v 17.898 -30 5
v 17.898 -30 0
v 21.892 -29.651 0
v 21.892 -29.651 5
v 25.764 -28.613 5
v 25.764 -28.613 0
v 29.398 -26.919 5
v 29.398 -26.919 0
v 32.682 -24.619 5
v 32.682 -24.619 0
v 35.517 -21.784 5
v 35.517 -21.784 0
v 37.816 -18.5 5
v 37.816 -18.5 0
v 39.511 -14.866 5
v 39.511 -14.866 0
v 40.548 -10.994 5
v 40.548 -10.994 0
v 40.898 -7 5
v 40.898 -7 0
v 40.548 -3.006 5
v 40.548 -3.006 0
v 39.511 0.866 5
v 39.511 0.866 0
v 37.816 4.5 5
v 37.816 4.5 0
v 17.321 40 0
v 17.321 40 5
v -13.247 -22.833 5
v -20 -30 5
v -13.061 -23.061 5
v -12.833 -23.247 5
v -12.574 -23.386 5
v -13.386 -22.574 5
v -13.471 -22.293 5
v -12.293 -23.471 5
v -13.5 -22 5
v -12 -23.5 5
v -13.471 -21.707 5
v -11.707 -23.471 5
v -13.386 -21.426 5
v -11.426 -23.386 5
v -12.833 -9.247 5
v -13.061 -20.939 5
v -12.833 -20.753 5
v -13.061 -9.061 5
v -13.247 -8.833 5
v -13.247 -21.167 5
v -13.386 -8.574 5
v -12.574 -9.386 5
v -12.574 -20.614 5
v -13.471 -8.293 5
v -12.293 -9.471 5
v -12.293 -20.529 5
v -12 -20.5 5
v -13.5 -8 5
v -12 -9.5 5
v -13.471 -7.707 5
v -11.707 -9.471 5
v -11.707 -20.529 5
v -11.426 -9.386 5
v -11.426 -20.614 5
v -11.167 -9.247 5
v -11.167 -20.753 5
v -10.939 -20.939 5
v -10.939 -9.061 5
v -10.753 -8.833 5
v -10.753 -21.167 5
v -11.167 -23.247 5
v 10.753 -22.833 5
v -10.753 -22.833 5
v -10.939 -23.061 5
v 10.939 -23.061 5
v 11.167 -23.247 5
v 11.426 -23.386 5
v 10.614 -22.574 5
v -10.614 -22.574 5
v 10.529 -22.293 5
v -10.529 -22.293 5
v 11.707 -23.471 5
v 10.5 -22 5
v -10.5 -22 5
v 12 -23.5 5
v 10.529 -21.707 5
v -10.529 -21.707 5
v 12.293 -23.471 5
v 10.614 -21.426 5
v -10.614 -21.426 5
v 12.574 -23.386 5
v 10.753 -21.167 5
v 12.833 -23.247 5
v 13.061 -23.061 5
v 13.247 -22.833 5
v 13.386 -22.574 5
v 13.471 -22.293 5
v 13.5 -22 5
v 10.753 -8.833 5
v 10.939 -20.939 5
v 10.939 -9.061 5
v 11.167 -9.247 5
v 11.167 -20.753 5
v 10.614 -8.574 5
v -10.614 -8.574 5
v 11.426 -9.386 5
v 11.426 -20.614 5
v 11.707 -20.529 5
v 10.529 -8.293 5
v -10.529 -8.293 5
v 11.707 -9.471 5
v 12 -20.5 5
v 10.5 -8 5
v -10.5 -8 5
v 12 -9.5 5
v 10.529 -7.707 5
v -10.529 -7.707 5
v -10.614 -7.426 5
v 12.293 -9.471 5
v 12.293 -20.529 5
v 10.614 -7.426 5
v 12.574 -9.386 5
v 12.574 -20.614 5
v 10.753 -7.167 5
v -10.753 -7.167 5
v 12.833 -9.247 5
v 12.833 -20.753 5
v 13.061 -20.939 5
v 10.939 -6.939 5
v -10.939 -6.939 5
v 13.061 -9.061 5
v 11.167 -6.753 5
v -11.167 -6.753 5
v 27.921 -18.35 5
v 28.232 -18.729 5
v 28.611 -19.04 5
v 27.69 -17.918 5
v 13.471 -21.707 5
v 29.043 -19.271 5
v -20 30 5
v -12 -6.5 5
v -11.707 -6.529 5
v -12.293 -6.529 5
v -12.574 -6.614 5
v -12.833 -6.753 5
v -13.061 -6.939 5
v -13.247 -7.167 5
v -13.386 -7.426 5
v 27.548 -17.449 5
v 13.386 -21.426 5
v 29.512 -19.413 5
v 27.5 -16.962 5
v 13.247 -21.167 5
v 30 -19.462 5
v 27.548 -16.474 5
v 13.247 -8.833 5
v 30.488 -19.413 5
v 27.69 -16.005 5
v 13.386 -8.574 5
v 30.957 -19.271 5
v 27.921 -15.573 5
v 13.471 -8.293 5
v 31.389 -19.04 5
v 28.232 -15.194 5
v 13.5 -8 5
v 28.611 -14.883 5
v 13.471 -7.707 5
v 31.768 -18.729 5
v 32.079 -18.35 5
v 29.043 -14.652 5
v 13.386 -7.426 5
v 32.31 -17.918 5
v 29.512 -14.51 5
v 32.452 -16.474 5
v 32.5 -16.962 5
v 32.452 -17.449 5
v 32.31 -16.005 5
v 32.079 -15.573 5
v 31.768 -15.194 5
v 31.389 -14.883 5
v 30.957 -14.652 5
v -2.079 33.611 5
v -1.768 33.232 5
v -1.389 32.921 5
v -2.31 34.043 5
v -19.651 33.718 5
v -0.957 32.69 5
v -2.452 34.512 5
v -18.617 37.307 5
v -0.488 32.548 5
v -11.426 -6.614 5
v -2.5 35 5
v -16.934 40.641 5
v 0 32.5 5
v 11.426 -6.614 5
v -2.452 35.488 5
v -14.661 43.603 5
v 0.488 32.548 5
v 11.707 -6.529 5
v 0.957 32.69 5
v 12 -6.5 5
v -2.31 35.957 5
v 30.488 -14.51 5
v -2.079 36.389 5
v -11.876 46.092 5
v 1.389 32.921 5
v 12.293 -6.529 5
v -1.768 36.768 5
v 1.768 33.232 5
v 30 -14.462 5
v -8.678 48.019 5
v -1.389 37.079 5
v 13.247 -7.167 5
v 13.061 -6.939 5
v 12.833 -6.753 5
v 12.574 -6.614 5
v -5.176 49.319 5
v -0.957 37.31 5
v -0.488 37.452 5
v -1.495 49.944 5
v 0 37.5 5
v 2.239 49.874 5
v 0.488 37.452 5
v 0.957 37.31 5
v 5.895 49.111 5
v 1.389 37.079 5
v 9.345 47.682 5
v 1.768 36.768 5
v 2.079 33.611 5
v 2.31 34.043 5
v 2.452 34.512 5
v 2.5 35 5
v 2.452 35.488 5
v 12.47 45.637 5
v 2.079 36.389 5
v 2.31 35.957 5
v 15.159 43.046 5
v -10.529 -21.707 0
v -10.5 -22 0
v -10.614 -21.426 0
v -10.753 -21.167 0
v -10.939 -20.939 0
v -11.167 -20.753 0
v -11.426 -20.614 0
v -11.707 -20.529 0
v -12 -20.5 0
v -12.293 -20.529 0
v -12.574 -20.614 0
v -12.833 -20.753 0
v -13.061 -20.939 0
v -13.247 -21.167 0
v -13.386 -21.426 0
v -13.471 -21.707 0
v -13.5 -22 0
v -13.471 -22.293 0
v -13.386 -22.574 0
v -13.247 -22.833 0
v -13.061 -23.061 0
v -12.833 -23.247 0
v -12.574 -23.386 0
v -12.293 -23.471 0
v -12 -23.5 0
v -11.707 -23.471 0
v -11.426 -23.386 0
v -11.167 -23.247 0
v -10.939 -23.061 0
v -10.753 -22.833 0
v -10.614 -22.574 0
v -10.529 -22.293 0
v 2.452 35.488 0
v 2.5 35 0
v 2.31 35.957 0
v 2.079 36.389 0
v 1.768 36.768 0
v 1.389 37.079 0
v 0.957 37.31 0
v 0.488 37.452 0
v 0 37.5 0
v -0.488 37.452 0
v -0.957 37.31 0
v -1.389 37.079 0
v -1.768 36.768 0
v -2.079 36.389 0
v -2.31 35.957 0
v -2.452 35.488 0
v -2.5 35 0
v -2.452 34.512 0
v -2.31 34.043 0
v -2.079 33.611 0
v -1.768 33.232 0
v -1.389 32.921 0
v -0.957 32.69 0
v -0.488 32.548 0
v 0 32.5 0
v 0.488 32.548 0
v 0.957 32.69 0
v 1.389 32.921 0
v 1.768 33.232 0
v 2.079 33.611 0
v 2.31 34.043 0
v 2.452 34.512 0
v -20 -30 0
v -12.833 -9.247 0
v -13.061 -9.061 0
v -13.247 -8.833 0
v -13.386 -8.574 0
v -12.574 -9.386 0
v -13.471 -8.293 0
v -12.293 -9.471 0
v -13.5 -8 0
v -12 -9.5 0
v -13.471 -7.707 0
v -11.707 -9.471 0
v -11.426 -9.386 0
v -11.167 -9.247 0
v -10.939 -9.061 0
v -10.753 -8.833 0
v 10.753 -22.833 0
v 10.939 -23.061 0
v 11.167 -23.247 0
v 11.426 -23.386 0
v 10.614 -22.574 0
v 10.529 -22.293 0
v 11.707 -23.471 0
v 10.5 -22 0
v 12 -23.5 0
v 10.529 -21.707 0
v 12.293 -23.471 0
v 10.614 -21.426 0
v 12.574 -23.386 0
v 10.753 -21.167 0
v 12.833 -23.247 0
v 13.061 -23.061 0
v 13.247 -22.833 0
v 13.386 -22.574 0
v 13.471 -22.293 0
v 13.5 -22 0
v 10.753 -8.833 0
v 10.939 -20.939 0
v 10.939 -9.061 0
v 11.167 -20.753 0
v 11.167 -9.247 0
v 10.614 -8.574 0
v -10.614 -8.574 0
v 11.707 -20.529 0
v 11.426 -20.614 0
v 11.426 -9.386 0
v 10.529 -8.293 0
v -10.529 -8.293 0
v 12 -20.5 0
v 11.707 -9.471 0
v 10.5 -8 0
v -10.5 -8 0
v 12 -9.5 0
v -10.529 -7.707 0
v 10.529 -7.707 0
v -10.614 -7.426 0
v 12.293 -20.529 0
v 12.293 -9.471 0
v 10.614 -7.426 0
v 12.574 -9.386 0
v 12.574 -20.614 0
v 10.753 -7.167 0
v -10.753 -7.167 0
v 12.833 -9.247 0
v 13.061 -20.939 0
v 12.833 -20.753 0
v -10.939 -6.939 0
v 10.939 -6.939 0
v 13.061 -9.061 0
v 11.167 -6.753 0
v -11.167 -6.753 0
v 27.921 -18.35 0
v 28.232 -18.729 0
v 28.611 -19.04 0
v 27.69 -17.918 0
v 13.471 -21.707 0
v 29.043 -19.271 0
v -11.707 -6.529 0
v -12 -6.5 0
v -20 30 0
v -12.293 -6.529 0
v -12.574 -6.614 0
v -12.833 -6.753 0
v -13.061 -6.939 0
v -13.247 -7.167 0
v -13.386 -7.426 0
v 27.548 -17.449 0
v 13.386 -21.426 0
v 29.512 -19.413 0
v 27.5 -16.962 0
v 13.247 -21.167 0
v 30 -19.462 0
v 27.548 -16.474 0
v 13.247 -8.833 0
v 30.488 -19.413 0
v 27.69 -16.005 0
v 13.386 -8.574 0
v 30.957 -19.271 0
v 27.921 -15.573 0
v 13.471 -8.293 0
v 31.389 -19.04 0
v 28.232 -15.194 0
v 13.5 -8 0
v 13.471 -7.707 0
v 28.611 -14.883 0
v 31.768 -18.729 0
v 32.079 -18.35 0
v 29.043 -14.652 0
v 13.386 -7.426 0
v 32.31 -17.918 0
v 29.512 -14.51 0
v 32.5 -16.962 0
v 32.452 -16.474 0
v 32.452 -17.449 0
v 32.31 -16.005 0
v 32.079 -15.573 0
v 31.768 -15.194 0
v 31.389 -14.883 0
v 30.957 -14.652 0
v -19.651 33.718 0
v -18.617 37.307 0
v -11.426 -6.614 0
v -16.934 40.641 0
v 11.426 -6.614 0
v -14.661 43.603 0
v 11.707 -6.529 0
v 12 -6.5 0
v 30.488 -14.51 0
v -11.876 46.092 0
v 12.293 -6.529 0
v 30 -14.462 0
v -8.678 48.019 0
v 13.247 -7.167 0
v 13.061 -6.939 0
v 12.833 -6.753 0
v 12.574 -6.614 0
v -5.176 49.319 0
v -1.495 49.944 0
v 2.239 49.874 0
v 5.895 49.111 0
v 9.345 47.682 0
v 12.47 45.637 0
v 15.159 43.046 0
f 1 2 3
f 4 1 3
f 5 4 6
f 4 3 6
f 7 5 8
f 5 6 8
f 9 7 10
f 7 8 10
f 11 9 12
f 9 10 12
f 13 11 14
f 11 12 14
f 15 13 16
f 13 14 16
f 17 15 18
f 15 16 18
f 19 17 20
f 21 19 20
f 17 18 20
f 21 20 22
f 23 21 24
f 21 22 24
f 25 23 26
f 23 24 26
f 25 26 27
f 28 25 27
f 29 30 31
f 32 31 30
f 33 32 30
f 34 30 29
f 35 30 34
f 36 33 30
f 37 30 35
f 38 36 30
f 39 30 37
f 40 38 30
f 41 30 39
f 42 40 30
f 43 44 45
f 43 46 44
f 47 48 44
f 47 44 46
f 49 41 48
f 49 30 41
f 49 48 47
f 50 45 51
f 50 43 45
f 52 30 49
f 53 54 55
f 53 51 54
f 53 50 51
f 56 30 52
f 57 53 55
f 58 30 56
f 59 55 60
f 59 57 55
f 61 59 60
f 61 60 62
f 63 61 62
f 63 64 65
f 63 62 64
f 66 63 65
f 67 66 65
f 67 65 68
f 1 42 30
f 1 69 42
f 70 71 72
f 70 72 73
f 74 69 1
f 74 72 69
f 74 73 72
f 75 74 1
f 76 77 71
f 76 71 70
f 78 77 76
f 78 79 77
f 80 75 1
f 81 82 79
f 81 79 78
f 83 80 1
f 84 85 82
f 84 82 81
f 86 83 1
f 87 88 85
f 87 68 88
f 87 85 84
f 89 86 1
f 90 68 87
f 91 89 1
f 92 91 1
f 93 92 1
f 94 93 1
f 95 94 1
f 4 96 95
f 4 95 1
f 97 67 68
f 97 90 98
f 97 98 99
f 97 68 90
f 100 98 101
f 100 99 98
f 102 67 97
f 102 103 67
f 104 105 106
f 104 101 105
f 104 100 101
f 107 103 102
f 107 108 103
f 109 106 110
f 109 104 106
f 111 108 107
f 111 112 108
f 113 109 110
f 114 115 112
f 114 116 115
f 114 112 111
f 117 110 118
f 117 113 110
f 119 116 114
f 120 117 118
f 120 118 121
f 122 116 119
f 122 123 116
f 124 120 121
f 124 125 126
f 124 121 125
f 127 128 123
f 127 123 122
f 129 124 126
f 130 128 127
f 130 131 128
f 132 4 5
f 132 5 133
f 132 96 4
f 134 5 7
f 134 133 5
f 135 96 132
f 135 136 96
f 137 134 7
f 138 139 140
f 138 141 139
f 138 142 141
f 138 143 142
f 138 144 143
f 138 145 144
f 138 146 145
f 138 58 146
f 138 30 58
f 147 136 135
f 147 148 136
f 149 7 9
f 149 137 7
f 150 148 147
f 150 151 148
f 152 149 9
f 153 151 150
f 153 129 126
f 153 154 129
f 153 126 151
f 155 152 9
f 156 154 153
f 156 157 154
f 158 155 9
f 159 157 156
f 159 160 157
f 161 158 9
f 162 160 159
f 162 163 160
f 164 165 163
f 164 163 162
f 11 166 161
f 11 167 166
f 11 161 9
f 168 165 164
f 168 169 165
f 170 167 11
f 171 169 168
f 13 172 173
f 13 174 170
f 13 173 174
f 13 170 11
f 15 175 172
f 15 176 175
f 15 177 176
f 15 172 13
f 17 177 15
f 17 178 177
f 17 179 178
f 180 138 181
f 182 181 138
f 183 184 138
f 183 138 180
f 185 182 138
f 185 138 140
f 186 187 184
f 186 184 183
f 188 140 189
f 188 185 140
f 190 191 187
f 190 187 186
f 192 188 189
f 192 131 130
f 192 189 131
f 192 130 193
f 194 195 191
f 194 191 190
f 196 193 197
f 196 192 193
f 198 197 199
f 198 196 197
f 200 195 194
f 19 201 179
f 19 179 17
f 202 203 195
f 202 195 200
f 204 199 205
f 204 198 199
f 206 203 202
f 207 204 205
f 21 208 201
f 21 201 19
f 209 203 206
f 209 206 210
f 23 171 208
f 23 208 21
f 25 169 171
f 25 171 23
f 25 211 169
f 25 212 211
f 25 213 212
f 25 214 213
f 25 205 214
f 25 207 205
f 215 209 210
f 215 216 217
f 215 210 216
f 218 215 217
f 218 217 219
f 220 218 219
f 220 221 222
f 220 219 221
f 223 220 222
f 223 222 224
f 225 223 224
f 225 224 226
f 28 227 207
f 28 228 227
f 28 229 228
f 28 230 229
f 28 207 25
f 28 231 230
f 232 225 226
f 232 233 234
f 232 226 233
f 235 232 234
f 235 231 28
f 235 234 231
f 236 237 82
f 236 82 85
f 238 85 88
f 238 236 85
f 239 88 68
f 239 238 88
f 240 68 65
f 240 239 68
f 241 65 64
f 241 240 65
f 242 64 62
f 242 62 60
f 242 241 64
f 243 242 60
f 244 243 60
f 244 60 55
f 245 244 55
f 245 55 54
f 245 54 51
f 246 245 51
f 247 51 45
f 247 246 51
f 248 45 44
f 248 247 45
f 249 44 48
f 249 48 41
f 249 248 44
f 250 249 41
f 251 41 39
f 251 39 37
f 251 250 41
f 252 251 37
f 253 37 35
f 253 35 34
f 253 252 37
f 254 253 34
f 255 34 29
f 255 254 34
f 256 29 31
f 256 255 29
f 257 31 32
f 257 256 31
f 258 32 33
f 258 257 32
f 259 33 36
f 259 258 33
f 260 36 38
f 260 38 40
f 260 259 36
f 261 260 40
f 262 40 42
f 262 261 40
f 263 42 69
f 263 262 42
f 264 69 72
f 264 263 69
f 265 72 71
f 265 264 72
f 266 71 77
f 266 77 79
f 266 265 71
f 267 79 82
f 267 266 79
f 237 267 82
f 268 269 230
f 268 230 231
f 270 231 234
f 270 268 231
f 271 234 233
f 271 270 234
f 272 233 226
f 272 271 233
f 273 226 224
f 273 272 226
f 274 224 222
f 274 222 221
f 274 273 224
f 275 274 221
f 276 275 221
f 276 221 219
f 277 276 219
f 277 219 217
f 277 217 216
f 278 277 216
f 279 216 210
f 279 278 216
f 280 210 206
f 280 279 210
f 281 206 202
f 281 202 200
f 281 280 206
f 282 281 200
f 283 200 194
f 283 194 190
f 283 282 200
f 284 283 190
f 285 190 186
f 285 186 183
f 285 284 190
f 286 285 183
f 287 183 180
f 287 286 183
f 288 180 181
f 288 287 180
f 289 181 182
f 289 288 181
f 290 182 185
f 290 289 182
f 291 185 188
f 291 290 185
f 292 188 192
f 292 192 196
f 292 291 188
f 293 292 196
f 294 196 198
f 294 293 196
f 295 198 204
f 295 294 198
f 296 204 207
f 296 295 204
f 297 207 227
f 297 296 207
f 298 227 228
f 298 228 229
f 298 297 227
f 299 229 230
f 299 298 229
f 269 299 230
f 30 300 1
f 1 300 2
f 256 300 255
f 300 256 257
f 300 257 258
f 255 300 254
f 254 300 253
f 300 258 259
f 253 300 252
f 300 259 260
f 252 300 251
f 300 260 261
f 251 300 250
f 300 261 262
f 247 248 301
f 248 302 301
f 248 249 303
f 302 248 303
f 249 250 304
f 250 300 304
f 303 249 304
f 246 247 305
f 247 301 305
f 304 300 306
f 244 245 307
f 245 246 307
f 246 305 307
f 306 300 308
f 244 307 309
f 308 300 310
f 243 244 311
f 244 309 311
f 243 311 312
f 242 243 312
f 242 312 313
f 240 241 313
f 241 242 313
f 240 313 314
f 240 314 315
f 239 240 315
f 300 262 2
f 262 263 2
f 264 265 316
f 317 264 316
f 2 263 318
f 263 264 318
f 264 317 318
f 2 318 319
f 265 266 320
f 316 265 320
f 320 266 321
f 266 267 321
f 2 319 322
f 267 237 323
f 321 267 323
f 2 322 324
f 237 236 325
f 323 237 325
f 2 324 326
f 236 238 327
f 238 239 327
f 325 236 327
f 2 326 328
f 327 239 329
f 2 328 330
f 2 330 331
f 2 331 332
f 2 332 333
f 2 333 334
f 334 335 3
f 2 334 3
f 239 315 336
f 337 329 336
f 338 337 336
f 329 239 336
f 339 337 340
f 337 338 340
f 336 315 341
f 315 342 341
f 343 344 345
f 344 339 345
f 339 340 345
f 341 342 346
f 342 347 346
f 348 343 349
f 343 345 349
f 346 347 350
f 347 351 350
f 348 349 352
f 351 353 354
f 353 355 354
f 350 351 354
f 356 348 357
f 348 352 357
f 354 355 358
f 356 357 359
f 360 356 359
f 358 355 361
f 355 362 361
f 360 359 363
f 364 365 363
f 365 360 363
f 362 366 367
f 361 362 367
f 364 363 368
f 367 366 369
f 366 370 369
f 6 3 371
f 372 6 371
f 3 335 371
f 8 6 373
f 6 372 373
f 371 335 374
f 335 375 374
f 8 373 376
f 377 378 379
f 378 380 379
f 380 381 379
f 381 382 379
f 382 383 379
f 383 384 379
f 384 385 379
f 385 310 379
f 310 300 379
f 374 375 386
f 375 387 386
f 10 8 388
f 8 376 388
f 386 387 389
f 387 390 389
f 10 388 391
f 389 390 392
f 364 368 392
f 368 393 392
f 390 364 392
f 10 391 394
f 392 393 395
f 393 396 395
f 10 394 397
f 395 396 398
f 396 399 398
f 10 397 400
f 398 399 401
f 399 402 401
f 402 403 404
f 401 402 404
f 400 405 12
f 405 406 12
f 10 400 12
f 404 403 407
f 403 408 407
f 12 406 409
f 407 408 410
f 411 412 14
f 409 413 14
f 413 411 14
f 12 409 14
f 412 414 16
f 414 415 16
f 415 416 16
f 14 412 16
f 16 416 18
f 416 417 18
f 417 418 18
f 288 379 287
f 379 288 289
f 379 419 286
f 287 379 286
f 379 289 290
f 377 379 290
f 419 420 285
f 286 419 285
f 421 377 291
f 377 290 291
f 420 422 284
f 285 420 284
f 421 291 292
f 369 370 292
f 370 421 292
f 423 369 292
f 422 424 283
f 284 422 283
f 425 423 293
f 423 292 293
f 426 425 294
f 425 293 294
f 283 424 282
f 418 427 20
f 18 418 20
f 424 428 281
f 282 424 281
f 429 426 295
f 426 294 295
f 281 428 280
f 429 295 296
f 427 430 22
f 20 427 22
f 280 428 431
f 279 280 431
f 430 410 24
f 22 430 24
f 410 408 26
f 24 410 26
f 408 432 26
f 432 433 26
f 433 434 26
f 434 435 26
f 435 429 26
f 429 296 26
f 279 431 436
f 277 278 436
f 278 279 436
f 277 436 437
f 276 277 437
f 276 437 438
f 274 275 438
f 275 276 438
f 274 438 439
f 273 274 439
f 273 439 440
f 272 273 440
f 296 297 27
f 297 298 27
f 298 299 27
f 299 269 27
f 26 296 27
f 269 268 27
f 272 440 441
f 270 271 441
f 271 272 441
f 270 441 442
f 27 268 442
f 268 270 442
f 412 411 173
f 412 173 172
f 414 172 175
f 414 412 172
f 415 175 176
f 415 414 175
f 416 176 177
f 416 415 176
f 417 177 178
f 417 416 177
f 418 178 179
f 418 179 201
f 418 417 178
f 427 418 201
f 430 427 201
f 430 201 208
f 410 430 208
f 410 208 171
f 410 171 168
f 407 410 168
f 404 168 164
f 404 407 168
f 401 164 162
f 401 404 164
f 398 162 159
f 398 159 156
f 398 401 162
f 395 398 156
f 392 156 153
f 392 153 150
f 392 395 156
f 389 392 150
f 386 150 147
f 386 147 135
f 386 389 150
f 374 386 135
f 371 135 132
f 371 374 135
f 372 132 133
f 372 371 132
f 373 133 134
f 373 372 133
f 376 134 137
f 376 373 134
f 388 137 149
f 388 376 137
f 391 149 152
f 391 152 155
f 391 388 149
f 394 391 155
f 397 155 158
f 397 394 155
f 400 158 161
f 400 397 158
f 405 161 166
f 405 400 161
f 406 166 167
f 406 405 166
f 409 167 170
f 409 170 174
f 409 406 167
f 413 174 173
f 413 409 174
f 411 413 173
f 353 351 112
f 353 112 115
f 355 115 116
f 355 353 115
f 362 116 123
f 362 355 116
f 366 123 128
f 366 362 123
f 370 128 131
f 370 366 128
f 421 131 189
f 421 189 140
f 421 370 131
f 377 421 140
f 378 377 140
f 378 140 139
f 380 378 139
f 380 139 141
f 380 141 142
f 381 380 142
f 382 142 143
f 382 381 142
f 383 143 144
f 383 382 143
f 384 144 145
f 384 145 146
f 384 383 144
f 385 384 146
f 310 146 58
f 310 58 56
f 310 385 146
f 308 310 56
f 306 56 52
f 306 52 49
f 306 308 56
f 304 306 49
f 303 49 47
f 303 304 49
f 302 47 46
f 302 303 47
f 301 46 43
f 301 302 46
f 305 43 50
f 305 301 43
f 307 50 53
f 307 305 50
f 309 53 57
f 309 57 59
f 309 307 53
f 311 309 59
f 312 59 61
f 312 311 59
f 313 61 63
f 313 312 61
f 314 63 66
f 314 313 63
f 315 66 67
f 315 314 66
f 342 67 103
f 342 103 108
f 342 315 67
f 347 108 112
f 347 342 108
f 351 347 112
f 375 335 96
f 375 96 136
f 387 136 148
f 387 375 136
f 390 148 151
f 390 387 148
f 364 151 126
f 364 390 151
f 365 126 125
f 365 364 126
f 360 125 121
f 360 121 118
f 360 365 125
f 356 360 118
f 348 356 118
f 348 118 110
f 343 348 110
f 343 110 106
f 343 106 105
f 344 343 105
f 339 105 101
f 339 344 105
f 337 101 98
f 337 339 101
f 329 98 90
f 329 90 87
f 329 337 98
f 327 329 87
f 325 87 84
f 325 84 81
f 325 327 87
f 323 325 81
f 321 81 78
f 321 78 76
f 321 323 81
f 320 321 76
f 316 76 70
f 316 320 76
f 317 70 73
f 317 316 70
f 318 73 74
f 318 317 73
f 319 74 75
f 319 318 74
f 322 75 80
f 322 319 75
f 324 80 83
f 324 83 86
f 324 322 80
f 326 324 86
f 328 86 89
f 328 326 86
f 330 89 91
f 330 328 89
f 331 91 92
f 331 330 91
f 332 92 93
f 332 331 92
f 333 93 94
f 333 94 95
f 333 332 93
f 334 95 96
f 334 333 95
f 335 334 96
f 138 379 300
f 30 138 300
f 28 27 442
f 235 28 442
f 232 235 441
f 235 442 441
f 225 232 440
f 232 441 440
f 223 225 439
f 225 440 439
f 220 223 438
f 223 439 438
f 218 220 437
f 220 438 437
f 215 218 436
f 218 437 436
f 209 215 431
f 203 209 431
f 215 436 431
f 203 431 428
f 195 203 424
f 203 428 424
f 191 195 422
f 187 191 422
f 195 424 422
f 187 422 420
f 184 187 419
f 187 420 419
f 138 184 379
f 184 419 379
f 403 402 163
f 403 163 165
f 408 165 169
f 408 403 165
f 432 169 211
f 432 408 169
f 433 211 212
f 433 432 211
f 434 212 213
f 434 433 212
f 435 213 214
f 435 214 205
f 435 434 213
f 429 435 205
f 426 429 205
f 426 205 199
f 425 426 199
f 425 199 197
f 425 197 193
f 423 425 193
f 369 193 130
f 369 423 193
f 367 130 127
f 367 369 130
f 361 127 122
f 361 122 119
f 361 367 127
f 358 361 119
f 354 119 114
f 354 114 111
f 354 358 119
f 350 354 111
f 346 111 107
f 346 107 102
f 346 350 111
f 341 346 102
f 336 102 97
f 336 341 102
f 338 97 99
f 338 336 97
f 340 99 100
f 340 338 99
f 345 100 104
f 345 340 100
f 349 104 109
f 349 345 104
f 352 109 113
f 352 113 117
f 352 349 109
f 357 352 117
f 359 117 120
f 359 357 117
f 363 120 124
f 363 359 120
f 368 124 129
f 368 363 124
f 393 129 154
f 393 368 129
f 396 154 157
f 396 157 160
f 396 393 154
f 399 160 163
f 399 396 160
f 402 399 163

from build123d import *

# Parameters (mm, degrees)
SKETCH_1_R      = 1.5
SKETCH_1_R_2    = 2.5
EXTRUDE_2_DEPTH = 5


with BuildPart() as part:
    # 草圖1 → 填料-伸長2 (new body)
    with BuildSketch(Plane.XY):
        with BuildLine():
            Line((-20, 30), (-20, -30))
            Line((-20, -30), (17.897858345, -30))
            ThreePointArc((17.897858345, -30), (37.816442632, -18.5), (37.816442632, 4.5))
            Line((37.816442632, 4.5), (17.320508076, 40))
            ThreePointArc((17.320508076, 40), (-5.176380902, 49.318516526), (-20, 30))
        make_face()
        with Locations((-12, -8)):
            Circle(SKETCH_1_R, mode=Mode.SUBTRACT)
        with Locations((-12, -22)):
            Circle(SKETCH_1_R, mode=Mode.SUBTRACT)
        with Locations((12, -22)):
            Circle(SKETCH_1_R, mode=Mode.SUBTRACT)
        with Locations((12, -8)):
            Circle(SKETCH_1_R, mode=Mode.SUBTRACT)
        with Locations((0, 35)):
            Circle(SKETCH_1_R_2, mode=Mode.SUBTRACT)
        with Locations((30, -16.961524227)):
            Circle(SKETCH_1_R_2, mode=Mode.SUBTRACT)
    extrude(amount=EXTRUDE_2_DEPTH)


solid = part.part
